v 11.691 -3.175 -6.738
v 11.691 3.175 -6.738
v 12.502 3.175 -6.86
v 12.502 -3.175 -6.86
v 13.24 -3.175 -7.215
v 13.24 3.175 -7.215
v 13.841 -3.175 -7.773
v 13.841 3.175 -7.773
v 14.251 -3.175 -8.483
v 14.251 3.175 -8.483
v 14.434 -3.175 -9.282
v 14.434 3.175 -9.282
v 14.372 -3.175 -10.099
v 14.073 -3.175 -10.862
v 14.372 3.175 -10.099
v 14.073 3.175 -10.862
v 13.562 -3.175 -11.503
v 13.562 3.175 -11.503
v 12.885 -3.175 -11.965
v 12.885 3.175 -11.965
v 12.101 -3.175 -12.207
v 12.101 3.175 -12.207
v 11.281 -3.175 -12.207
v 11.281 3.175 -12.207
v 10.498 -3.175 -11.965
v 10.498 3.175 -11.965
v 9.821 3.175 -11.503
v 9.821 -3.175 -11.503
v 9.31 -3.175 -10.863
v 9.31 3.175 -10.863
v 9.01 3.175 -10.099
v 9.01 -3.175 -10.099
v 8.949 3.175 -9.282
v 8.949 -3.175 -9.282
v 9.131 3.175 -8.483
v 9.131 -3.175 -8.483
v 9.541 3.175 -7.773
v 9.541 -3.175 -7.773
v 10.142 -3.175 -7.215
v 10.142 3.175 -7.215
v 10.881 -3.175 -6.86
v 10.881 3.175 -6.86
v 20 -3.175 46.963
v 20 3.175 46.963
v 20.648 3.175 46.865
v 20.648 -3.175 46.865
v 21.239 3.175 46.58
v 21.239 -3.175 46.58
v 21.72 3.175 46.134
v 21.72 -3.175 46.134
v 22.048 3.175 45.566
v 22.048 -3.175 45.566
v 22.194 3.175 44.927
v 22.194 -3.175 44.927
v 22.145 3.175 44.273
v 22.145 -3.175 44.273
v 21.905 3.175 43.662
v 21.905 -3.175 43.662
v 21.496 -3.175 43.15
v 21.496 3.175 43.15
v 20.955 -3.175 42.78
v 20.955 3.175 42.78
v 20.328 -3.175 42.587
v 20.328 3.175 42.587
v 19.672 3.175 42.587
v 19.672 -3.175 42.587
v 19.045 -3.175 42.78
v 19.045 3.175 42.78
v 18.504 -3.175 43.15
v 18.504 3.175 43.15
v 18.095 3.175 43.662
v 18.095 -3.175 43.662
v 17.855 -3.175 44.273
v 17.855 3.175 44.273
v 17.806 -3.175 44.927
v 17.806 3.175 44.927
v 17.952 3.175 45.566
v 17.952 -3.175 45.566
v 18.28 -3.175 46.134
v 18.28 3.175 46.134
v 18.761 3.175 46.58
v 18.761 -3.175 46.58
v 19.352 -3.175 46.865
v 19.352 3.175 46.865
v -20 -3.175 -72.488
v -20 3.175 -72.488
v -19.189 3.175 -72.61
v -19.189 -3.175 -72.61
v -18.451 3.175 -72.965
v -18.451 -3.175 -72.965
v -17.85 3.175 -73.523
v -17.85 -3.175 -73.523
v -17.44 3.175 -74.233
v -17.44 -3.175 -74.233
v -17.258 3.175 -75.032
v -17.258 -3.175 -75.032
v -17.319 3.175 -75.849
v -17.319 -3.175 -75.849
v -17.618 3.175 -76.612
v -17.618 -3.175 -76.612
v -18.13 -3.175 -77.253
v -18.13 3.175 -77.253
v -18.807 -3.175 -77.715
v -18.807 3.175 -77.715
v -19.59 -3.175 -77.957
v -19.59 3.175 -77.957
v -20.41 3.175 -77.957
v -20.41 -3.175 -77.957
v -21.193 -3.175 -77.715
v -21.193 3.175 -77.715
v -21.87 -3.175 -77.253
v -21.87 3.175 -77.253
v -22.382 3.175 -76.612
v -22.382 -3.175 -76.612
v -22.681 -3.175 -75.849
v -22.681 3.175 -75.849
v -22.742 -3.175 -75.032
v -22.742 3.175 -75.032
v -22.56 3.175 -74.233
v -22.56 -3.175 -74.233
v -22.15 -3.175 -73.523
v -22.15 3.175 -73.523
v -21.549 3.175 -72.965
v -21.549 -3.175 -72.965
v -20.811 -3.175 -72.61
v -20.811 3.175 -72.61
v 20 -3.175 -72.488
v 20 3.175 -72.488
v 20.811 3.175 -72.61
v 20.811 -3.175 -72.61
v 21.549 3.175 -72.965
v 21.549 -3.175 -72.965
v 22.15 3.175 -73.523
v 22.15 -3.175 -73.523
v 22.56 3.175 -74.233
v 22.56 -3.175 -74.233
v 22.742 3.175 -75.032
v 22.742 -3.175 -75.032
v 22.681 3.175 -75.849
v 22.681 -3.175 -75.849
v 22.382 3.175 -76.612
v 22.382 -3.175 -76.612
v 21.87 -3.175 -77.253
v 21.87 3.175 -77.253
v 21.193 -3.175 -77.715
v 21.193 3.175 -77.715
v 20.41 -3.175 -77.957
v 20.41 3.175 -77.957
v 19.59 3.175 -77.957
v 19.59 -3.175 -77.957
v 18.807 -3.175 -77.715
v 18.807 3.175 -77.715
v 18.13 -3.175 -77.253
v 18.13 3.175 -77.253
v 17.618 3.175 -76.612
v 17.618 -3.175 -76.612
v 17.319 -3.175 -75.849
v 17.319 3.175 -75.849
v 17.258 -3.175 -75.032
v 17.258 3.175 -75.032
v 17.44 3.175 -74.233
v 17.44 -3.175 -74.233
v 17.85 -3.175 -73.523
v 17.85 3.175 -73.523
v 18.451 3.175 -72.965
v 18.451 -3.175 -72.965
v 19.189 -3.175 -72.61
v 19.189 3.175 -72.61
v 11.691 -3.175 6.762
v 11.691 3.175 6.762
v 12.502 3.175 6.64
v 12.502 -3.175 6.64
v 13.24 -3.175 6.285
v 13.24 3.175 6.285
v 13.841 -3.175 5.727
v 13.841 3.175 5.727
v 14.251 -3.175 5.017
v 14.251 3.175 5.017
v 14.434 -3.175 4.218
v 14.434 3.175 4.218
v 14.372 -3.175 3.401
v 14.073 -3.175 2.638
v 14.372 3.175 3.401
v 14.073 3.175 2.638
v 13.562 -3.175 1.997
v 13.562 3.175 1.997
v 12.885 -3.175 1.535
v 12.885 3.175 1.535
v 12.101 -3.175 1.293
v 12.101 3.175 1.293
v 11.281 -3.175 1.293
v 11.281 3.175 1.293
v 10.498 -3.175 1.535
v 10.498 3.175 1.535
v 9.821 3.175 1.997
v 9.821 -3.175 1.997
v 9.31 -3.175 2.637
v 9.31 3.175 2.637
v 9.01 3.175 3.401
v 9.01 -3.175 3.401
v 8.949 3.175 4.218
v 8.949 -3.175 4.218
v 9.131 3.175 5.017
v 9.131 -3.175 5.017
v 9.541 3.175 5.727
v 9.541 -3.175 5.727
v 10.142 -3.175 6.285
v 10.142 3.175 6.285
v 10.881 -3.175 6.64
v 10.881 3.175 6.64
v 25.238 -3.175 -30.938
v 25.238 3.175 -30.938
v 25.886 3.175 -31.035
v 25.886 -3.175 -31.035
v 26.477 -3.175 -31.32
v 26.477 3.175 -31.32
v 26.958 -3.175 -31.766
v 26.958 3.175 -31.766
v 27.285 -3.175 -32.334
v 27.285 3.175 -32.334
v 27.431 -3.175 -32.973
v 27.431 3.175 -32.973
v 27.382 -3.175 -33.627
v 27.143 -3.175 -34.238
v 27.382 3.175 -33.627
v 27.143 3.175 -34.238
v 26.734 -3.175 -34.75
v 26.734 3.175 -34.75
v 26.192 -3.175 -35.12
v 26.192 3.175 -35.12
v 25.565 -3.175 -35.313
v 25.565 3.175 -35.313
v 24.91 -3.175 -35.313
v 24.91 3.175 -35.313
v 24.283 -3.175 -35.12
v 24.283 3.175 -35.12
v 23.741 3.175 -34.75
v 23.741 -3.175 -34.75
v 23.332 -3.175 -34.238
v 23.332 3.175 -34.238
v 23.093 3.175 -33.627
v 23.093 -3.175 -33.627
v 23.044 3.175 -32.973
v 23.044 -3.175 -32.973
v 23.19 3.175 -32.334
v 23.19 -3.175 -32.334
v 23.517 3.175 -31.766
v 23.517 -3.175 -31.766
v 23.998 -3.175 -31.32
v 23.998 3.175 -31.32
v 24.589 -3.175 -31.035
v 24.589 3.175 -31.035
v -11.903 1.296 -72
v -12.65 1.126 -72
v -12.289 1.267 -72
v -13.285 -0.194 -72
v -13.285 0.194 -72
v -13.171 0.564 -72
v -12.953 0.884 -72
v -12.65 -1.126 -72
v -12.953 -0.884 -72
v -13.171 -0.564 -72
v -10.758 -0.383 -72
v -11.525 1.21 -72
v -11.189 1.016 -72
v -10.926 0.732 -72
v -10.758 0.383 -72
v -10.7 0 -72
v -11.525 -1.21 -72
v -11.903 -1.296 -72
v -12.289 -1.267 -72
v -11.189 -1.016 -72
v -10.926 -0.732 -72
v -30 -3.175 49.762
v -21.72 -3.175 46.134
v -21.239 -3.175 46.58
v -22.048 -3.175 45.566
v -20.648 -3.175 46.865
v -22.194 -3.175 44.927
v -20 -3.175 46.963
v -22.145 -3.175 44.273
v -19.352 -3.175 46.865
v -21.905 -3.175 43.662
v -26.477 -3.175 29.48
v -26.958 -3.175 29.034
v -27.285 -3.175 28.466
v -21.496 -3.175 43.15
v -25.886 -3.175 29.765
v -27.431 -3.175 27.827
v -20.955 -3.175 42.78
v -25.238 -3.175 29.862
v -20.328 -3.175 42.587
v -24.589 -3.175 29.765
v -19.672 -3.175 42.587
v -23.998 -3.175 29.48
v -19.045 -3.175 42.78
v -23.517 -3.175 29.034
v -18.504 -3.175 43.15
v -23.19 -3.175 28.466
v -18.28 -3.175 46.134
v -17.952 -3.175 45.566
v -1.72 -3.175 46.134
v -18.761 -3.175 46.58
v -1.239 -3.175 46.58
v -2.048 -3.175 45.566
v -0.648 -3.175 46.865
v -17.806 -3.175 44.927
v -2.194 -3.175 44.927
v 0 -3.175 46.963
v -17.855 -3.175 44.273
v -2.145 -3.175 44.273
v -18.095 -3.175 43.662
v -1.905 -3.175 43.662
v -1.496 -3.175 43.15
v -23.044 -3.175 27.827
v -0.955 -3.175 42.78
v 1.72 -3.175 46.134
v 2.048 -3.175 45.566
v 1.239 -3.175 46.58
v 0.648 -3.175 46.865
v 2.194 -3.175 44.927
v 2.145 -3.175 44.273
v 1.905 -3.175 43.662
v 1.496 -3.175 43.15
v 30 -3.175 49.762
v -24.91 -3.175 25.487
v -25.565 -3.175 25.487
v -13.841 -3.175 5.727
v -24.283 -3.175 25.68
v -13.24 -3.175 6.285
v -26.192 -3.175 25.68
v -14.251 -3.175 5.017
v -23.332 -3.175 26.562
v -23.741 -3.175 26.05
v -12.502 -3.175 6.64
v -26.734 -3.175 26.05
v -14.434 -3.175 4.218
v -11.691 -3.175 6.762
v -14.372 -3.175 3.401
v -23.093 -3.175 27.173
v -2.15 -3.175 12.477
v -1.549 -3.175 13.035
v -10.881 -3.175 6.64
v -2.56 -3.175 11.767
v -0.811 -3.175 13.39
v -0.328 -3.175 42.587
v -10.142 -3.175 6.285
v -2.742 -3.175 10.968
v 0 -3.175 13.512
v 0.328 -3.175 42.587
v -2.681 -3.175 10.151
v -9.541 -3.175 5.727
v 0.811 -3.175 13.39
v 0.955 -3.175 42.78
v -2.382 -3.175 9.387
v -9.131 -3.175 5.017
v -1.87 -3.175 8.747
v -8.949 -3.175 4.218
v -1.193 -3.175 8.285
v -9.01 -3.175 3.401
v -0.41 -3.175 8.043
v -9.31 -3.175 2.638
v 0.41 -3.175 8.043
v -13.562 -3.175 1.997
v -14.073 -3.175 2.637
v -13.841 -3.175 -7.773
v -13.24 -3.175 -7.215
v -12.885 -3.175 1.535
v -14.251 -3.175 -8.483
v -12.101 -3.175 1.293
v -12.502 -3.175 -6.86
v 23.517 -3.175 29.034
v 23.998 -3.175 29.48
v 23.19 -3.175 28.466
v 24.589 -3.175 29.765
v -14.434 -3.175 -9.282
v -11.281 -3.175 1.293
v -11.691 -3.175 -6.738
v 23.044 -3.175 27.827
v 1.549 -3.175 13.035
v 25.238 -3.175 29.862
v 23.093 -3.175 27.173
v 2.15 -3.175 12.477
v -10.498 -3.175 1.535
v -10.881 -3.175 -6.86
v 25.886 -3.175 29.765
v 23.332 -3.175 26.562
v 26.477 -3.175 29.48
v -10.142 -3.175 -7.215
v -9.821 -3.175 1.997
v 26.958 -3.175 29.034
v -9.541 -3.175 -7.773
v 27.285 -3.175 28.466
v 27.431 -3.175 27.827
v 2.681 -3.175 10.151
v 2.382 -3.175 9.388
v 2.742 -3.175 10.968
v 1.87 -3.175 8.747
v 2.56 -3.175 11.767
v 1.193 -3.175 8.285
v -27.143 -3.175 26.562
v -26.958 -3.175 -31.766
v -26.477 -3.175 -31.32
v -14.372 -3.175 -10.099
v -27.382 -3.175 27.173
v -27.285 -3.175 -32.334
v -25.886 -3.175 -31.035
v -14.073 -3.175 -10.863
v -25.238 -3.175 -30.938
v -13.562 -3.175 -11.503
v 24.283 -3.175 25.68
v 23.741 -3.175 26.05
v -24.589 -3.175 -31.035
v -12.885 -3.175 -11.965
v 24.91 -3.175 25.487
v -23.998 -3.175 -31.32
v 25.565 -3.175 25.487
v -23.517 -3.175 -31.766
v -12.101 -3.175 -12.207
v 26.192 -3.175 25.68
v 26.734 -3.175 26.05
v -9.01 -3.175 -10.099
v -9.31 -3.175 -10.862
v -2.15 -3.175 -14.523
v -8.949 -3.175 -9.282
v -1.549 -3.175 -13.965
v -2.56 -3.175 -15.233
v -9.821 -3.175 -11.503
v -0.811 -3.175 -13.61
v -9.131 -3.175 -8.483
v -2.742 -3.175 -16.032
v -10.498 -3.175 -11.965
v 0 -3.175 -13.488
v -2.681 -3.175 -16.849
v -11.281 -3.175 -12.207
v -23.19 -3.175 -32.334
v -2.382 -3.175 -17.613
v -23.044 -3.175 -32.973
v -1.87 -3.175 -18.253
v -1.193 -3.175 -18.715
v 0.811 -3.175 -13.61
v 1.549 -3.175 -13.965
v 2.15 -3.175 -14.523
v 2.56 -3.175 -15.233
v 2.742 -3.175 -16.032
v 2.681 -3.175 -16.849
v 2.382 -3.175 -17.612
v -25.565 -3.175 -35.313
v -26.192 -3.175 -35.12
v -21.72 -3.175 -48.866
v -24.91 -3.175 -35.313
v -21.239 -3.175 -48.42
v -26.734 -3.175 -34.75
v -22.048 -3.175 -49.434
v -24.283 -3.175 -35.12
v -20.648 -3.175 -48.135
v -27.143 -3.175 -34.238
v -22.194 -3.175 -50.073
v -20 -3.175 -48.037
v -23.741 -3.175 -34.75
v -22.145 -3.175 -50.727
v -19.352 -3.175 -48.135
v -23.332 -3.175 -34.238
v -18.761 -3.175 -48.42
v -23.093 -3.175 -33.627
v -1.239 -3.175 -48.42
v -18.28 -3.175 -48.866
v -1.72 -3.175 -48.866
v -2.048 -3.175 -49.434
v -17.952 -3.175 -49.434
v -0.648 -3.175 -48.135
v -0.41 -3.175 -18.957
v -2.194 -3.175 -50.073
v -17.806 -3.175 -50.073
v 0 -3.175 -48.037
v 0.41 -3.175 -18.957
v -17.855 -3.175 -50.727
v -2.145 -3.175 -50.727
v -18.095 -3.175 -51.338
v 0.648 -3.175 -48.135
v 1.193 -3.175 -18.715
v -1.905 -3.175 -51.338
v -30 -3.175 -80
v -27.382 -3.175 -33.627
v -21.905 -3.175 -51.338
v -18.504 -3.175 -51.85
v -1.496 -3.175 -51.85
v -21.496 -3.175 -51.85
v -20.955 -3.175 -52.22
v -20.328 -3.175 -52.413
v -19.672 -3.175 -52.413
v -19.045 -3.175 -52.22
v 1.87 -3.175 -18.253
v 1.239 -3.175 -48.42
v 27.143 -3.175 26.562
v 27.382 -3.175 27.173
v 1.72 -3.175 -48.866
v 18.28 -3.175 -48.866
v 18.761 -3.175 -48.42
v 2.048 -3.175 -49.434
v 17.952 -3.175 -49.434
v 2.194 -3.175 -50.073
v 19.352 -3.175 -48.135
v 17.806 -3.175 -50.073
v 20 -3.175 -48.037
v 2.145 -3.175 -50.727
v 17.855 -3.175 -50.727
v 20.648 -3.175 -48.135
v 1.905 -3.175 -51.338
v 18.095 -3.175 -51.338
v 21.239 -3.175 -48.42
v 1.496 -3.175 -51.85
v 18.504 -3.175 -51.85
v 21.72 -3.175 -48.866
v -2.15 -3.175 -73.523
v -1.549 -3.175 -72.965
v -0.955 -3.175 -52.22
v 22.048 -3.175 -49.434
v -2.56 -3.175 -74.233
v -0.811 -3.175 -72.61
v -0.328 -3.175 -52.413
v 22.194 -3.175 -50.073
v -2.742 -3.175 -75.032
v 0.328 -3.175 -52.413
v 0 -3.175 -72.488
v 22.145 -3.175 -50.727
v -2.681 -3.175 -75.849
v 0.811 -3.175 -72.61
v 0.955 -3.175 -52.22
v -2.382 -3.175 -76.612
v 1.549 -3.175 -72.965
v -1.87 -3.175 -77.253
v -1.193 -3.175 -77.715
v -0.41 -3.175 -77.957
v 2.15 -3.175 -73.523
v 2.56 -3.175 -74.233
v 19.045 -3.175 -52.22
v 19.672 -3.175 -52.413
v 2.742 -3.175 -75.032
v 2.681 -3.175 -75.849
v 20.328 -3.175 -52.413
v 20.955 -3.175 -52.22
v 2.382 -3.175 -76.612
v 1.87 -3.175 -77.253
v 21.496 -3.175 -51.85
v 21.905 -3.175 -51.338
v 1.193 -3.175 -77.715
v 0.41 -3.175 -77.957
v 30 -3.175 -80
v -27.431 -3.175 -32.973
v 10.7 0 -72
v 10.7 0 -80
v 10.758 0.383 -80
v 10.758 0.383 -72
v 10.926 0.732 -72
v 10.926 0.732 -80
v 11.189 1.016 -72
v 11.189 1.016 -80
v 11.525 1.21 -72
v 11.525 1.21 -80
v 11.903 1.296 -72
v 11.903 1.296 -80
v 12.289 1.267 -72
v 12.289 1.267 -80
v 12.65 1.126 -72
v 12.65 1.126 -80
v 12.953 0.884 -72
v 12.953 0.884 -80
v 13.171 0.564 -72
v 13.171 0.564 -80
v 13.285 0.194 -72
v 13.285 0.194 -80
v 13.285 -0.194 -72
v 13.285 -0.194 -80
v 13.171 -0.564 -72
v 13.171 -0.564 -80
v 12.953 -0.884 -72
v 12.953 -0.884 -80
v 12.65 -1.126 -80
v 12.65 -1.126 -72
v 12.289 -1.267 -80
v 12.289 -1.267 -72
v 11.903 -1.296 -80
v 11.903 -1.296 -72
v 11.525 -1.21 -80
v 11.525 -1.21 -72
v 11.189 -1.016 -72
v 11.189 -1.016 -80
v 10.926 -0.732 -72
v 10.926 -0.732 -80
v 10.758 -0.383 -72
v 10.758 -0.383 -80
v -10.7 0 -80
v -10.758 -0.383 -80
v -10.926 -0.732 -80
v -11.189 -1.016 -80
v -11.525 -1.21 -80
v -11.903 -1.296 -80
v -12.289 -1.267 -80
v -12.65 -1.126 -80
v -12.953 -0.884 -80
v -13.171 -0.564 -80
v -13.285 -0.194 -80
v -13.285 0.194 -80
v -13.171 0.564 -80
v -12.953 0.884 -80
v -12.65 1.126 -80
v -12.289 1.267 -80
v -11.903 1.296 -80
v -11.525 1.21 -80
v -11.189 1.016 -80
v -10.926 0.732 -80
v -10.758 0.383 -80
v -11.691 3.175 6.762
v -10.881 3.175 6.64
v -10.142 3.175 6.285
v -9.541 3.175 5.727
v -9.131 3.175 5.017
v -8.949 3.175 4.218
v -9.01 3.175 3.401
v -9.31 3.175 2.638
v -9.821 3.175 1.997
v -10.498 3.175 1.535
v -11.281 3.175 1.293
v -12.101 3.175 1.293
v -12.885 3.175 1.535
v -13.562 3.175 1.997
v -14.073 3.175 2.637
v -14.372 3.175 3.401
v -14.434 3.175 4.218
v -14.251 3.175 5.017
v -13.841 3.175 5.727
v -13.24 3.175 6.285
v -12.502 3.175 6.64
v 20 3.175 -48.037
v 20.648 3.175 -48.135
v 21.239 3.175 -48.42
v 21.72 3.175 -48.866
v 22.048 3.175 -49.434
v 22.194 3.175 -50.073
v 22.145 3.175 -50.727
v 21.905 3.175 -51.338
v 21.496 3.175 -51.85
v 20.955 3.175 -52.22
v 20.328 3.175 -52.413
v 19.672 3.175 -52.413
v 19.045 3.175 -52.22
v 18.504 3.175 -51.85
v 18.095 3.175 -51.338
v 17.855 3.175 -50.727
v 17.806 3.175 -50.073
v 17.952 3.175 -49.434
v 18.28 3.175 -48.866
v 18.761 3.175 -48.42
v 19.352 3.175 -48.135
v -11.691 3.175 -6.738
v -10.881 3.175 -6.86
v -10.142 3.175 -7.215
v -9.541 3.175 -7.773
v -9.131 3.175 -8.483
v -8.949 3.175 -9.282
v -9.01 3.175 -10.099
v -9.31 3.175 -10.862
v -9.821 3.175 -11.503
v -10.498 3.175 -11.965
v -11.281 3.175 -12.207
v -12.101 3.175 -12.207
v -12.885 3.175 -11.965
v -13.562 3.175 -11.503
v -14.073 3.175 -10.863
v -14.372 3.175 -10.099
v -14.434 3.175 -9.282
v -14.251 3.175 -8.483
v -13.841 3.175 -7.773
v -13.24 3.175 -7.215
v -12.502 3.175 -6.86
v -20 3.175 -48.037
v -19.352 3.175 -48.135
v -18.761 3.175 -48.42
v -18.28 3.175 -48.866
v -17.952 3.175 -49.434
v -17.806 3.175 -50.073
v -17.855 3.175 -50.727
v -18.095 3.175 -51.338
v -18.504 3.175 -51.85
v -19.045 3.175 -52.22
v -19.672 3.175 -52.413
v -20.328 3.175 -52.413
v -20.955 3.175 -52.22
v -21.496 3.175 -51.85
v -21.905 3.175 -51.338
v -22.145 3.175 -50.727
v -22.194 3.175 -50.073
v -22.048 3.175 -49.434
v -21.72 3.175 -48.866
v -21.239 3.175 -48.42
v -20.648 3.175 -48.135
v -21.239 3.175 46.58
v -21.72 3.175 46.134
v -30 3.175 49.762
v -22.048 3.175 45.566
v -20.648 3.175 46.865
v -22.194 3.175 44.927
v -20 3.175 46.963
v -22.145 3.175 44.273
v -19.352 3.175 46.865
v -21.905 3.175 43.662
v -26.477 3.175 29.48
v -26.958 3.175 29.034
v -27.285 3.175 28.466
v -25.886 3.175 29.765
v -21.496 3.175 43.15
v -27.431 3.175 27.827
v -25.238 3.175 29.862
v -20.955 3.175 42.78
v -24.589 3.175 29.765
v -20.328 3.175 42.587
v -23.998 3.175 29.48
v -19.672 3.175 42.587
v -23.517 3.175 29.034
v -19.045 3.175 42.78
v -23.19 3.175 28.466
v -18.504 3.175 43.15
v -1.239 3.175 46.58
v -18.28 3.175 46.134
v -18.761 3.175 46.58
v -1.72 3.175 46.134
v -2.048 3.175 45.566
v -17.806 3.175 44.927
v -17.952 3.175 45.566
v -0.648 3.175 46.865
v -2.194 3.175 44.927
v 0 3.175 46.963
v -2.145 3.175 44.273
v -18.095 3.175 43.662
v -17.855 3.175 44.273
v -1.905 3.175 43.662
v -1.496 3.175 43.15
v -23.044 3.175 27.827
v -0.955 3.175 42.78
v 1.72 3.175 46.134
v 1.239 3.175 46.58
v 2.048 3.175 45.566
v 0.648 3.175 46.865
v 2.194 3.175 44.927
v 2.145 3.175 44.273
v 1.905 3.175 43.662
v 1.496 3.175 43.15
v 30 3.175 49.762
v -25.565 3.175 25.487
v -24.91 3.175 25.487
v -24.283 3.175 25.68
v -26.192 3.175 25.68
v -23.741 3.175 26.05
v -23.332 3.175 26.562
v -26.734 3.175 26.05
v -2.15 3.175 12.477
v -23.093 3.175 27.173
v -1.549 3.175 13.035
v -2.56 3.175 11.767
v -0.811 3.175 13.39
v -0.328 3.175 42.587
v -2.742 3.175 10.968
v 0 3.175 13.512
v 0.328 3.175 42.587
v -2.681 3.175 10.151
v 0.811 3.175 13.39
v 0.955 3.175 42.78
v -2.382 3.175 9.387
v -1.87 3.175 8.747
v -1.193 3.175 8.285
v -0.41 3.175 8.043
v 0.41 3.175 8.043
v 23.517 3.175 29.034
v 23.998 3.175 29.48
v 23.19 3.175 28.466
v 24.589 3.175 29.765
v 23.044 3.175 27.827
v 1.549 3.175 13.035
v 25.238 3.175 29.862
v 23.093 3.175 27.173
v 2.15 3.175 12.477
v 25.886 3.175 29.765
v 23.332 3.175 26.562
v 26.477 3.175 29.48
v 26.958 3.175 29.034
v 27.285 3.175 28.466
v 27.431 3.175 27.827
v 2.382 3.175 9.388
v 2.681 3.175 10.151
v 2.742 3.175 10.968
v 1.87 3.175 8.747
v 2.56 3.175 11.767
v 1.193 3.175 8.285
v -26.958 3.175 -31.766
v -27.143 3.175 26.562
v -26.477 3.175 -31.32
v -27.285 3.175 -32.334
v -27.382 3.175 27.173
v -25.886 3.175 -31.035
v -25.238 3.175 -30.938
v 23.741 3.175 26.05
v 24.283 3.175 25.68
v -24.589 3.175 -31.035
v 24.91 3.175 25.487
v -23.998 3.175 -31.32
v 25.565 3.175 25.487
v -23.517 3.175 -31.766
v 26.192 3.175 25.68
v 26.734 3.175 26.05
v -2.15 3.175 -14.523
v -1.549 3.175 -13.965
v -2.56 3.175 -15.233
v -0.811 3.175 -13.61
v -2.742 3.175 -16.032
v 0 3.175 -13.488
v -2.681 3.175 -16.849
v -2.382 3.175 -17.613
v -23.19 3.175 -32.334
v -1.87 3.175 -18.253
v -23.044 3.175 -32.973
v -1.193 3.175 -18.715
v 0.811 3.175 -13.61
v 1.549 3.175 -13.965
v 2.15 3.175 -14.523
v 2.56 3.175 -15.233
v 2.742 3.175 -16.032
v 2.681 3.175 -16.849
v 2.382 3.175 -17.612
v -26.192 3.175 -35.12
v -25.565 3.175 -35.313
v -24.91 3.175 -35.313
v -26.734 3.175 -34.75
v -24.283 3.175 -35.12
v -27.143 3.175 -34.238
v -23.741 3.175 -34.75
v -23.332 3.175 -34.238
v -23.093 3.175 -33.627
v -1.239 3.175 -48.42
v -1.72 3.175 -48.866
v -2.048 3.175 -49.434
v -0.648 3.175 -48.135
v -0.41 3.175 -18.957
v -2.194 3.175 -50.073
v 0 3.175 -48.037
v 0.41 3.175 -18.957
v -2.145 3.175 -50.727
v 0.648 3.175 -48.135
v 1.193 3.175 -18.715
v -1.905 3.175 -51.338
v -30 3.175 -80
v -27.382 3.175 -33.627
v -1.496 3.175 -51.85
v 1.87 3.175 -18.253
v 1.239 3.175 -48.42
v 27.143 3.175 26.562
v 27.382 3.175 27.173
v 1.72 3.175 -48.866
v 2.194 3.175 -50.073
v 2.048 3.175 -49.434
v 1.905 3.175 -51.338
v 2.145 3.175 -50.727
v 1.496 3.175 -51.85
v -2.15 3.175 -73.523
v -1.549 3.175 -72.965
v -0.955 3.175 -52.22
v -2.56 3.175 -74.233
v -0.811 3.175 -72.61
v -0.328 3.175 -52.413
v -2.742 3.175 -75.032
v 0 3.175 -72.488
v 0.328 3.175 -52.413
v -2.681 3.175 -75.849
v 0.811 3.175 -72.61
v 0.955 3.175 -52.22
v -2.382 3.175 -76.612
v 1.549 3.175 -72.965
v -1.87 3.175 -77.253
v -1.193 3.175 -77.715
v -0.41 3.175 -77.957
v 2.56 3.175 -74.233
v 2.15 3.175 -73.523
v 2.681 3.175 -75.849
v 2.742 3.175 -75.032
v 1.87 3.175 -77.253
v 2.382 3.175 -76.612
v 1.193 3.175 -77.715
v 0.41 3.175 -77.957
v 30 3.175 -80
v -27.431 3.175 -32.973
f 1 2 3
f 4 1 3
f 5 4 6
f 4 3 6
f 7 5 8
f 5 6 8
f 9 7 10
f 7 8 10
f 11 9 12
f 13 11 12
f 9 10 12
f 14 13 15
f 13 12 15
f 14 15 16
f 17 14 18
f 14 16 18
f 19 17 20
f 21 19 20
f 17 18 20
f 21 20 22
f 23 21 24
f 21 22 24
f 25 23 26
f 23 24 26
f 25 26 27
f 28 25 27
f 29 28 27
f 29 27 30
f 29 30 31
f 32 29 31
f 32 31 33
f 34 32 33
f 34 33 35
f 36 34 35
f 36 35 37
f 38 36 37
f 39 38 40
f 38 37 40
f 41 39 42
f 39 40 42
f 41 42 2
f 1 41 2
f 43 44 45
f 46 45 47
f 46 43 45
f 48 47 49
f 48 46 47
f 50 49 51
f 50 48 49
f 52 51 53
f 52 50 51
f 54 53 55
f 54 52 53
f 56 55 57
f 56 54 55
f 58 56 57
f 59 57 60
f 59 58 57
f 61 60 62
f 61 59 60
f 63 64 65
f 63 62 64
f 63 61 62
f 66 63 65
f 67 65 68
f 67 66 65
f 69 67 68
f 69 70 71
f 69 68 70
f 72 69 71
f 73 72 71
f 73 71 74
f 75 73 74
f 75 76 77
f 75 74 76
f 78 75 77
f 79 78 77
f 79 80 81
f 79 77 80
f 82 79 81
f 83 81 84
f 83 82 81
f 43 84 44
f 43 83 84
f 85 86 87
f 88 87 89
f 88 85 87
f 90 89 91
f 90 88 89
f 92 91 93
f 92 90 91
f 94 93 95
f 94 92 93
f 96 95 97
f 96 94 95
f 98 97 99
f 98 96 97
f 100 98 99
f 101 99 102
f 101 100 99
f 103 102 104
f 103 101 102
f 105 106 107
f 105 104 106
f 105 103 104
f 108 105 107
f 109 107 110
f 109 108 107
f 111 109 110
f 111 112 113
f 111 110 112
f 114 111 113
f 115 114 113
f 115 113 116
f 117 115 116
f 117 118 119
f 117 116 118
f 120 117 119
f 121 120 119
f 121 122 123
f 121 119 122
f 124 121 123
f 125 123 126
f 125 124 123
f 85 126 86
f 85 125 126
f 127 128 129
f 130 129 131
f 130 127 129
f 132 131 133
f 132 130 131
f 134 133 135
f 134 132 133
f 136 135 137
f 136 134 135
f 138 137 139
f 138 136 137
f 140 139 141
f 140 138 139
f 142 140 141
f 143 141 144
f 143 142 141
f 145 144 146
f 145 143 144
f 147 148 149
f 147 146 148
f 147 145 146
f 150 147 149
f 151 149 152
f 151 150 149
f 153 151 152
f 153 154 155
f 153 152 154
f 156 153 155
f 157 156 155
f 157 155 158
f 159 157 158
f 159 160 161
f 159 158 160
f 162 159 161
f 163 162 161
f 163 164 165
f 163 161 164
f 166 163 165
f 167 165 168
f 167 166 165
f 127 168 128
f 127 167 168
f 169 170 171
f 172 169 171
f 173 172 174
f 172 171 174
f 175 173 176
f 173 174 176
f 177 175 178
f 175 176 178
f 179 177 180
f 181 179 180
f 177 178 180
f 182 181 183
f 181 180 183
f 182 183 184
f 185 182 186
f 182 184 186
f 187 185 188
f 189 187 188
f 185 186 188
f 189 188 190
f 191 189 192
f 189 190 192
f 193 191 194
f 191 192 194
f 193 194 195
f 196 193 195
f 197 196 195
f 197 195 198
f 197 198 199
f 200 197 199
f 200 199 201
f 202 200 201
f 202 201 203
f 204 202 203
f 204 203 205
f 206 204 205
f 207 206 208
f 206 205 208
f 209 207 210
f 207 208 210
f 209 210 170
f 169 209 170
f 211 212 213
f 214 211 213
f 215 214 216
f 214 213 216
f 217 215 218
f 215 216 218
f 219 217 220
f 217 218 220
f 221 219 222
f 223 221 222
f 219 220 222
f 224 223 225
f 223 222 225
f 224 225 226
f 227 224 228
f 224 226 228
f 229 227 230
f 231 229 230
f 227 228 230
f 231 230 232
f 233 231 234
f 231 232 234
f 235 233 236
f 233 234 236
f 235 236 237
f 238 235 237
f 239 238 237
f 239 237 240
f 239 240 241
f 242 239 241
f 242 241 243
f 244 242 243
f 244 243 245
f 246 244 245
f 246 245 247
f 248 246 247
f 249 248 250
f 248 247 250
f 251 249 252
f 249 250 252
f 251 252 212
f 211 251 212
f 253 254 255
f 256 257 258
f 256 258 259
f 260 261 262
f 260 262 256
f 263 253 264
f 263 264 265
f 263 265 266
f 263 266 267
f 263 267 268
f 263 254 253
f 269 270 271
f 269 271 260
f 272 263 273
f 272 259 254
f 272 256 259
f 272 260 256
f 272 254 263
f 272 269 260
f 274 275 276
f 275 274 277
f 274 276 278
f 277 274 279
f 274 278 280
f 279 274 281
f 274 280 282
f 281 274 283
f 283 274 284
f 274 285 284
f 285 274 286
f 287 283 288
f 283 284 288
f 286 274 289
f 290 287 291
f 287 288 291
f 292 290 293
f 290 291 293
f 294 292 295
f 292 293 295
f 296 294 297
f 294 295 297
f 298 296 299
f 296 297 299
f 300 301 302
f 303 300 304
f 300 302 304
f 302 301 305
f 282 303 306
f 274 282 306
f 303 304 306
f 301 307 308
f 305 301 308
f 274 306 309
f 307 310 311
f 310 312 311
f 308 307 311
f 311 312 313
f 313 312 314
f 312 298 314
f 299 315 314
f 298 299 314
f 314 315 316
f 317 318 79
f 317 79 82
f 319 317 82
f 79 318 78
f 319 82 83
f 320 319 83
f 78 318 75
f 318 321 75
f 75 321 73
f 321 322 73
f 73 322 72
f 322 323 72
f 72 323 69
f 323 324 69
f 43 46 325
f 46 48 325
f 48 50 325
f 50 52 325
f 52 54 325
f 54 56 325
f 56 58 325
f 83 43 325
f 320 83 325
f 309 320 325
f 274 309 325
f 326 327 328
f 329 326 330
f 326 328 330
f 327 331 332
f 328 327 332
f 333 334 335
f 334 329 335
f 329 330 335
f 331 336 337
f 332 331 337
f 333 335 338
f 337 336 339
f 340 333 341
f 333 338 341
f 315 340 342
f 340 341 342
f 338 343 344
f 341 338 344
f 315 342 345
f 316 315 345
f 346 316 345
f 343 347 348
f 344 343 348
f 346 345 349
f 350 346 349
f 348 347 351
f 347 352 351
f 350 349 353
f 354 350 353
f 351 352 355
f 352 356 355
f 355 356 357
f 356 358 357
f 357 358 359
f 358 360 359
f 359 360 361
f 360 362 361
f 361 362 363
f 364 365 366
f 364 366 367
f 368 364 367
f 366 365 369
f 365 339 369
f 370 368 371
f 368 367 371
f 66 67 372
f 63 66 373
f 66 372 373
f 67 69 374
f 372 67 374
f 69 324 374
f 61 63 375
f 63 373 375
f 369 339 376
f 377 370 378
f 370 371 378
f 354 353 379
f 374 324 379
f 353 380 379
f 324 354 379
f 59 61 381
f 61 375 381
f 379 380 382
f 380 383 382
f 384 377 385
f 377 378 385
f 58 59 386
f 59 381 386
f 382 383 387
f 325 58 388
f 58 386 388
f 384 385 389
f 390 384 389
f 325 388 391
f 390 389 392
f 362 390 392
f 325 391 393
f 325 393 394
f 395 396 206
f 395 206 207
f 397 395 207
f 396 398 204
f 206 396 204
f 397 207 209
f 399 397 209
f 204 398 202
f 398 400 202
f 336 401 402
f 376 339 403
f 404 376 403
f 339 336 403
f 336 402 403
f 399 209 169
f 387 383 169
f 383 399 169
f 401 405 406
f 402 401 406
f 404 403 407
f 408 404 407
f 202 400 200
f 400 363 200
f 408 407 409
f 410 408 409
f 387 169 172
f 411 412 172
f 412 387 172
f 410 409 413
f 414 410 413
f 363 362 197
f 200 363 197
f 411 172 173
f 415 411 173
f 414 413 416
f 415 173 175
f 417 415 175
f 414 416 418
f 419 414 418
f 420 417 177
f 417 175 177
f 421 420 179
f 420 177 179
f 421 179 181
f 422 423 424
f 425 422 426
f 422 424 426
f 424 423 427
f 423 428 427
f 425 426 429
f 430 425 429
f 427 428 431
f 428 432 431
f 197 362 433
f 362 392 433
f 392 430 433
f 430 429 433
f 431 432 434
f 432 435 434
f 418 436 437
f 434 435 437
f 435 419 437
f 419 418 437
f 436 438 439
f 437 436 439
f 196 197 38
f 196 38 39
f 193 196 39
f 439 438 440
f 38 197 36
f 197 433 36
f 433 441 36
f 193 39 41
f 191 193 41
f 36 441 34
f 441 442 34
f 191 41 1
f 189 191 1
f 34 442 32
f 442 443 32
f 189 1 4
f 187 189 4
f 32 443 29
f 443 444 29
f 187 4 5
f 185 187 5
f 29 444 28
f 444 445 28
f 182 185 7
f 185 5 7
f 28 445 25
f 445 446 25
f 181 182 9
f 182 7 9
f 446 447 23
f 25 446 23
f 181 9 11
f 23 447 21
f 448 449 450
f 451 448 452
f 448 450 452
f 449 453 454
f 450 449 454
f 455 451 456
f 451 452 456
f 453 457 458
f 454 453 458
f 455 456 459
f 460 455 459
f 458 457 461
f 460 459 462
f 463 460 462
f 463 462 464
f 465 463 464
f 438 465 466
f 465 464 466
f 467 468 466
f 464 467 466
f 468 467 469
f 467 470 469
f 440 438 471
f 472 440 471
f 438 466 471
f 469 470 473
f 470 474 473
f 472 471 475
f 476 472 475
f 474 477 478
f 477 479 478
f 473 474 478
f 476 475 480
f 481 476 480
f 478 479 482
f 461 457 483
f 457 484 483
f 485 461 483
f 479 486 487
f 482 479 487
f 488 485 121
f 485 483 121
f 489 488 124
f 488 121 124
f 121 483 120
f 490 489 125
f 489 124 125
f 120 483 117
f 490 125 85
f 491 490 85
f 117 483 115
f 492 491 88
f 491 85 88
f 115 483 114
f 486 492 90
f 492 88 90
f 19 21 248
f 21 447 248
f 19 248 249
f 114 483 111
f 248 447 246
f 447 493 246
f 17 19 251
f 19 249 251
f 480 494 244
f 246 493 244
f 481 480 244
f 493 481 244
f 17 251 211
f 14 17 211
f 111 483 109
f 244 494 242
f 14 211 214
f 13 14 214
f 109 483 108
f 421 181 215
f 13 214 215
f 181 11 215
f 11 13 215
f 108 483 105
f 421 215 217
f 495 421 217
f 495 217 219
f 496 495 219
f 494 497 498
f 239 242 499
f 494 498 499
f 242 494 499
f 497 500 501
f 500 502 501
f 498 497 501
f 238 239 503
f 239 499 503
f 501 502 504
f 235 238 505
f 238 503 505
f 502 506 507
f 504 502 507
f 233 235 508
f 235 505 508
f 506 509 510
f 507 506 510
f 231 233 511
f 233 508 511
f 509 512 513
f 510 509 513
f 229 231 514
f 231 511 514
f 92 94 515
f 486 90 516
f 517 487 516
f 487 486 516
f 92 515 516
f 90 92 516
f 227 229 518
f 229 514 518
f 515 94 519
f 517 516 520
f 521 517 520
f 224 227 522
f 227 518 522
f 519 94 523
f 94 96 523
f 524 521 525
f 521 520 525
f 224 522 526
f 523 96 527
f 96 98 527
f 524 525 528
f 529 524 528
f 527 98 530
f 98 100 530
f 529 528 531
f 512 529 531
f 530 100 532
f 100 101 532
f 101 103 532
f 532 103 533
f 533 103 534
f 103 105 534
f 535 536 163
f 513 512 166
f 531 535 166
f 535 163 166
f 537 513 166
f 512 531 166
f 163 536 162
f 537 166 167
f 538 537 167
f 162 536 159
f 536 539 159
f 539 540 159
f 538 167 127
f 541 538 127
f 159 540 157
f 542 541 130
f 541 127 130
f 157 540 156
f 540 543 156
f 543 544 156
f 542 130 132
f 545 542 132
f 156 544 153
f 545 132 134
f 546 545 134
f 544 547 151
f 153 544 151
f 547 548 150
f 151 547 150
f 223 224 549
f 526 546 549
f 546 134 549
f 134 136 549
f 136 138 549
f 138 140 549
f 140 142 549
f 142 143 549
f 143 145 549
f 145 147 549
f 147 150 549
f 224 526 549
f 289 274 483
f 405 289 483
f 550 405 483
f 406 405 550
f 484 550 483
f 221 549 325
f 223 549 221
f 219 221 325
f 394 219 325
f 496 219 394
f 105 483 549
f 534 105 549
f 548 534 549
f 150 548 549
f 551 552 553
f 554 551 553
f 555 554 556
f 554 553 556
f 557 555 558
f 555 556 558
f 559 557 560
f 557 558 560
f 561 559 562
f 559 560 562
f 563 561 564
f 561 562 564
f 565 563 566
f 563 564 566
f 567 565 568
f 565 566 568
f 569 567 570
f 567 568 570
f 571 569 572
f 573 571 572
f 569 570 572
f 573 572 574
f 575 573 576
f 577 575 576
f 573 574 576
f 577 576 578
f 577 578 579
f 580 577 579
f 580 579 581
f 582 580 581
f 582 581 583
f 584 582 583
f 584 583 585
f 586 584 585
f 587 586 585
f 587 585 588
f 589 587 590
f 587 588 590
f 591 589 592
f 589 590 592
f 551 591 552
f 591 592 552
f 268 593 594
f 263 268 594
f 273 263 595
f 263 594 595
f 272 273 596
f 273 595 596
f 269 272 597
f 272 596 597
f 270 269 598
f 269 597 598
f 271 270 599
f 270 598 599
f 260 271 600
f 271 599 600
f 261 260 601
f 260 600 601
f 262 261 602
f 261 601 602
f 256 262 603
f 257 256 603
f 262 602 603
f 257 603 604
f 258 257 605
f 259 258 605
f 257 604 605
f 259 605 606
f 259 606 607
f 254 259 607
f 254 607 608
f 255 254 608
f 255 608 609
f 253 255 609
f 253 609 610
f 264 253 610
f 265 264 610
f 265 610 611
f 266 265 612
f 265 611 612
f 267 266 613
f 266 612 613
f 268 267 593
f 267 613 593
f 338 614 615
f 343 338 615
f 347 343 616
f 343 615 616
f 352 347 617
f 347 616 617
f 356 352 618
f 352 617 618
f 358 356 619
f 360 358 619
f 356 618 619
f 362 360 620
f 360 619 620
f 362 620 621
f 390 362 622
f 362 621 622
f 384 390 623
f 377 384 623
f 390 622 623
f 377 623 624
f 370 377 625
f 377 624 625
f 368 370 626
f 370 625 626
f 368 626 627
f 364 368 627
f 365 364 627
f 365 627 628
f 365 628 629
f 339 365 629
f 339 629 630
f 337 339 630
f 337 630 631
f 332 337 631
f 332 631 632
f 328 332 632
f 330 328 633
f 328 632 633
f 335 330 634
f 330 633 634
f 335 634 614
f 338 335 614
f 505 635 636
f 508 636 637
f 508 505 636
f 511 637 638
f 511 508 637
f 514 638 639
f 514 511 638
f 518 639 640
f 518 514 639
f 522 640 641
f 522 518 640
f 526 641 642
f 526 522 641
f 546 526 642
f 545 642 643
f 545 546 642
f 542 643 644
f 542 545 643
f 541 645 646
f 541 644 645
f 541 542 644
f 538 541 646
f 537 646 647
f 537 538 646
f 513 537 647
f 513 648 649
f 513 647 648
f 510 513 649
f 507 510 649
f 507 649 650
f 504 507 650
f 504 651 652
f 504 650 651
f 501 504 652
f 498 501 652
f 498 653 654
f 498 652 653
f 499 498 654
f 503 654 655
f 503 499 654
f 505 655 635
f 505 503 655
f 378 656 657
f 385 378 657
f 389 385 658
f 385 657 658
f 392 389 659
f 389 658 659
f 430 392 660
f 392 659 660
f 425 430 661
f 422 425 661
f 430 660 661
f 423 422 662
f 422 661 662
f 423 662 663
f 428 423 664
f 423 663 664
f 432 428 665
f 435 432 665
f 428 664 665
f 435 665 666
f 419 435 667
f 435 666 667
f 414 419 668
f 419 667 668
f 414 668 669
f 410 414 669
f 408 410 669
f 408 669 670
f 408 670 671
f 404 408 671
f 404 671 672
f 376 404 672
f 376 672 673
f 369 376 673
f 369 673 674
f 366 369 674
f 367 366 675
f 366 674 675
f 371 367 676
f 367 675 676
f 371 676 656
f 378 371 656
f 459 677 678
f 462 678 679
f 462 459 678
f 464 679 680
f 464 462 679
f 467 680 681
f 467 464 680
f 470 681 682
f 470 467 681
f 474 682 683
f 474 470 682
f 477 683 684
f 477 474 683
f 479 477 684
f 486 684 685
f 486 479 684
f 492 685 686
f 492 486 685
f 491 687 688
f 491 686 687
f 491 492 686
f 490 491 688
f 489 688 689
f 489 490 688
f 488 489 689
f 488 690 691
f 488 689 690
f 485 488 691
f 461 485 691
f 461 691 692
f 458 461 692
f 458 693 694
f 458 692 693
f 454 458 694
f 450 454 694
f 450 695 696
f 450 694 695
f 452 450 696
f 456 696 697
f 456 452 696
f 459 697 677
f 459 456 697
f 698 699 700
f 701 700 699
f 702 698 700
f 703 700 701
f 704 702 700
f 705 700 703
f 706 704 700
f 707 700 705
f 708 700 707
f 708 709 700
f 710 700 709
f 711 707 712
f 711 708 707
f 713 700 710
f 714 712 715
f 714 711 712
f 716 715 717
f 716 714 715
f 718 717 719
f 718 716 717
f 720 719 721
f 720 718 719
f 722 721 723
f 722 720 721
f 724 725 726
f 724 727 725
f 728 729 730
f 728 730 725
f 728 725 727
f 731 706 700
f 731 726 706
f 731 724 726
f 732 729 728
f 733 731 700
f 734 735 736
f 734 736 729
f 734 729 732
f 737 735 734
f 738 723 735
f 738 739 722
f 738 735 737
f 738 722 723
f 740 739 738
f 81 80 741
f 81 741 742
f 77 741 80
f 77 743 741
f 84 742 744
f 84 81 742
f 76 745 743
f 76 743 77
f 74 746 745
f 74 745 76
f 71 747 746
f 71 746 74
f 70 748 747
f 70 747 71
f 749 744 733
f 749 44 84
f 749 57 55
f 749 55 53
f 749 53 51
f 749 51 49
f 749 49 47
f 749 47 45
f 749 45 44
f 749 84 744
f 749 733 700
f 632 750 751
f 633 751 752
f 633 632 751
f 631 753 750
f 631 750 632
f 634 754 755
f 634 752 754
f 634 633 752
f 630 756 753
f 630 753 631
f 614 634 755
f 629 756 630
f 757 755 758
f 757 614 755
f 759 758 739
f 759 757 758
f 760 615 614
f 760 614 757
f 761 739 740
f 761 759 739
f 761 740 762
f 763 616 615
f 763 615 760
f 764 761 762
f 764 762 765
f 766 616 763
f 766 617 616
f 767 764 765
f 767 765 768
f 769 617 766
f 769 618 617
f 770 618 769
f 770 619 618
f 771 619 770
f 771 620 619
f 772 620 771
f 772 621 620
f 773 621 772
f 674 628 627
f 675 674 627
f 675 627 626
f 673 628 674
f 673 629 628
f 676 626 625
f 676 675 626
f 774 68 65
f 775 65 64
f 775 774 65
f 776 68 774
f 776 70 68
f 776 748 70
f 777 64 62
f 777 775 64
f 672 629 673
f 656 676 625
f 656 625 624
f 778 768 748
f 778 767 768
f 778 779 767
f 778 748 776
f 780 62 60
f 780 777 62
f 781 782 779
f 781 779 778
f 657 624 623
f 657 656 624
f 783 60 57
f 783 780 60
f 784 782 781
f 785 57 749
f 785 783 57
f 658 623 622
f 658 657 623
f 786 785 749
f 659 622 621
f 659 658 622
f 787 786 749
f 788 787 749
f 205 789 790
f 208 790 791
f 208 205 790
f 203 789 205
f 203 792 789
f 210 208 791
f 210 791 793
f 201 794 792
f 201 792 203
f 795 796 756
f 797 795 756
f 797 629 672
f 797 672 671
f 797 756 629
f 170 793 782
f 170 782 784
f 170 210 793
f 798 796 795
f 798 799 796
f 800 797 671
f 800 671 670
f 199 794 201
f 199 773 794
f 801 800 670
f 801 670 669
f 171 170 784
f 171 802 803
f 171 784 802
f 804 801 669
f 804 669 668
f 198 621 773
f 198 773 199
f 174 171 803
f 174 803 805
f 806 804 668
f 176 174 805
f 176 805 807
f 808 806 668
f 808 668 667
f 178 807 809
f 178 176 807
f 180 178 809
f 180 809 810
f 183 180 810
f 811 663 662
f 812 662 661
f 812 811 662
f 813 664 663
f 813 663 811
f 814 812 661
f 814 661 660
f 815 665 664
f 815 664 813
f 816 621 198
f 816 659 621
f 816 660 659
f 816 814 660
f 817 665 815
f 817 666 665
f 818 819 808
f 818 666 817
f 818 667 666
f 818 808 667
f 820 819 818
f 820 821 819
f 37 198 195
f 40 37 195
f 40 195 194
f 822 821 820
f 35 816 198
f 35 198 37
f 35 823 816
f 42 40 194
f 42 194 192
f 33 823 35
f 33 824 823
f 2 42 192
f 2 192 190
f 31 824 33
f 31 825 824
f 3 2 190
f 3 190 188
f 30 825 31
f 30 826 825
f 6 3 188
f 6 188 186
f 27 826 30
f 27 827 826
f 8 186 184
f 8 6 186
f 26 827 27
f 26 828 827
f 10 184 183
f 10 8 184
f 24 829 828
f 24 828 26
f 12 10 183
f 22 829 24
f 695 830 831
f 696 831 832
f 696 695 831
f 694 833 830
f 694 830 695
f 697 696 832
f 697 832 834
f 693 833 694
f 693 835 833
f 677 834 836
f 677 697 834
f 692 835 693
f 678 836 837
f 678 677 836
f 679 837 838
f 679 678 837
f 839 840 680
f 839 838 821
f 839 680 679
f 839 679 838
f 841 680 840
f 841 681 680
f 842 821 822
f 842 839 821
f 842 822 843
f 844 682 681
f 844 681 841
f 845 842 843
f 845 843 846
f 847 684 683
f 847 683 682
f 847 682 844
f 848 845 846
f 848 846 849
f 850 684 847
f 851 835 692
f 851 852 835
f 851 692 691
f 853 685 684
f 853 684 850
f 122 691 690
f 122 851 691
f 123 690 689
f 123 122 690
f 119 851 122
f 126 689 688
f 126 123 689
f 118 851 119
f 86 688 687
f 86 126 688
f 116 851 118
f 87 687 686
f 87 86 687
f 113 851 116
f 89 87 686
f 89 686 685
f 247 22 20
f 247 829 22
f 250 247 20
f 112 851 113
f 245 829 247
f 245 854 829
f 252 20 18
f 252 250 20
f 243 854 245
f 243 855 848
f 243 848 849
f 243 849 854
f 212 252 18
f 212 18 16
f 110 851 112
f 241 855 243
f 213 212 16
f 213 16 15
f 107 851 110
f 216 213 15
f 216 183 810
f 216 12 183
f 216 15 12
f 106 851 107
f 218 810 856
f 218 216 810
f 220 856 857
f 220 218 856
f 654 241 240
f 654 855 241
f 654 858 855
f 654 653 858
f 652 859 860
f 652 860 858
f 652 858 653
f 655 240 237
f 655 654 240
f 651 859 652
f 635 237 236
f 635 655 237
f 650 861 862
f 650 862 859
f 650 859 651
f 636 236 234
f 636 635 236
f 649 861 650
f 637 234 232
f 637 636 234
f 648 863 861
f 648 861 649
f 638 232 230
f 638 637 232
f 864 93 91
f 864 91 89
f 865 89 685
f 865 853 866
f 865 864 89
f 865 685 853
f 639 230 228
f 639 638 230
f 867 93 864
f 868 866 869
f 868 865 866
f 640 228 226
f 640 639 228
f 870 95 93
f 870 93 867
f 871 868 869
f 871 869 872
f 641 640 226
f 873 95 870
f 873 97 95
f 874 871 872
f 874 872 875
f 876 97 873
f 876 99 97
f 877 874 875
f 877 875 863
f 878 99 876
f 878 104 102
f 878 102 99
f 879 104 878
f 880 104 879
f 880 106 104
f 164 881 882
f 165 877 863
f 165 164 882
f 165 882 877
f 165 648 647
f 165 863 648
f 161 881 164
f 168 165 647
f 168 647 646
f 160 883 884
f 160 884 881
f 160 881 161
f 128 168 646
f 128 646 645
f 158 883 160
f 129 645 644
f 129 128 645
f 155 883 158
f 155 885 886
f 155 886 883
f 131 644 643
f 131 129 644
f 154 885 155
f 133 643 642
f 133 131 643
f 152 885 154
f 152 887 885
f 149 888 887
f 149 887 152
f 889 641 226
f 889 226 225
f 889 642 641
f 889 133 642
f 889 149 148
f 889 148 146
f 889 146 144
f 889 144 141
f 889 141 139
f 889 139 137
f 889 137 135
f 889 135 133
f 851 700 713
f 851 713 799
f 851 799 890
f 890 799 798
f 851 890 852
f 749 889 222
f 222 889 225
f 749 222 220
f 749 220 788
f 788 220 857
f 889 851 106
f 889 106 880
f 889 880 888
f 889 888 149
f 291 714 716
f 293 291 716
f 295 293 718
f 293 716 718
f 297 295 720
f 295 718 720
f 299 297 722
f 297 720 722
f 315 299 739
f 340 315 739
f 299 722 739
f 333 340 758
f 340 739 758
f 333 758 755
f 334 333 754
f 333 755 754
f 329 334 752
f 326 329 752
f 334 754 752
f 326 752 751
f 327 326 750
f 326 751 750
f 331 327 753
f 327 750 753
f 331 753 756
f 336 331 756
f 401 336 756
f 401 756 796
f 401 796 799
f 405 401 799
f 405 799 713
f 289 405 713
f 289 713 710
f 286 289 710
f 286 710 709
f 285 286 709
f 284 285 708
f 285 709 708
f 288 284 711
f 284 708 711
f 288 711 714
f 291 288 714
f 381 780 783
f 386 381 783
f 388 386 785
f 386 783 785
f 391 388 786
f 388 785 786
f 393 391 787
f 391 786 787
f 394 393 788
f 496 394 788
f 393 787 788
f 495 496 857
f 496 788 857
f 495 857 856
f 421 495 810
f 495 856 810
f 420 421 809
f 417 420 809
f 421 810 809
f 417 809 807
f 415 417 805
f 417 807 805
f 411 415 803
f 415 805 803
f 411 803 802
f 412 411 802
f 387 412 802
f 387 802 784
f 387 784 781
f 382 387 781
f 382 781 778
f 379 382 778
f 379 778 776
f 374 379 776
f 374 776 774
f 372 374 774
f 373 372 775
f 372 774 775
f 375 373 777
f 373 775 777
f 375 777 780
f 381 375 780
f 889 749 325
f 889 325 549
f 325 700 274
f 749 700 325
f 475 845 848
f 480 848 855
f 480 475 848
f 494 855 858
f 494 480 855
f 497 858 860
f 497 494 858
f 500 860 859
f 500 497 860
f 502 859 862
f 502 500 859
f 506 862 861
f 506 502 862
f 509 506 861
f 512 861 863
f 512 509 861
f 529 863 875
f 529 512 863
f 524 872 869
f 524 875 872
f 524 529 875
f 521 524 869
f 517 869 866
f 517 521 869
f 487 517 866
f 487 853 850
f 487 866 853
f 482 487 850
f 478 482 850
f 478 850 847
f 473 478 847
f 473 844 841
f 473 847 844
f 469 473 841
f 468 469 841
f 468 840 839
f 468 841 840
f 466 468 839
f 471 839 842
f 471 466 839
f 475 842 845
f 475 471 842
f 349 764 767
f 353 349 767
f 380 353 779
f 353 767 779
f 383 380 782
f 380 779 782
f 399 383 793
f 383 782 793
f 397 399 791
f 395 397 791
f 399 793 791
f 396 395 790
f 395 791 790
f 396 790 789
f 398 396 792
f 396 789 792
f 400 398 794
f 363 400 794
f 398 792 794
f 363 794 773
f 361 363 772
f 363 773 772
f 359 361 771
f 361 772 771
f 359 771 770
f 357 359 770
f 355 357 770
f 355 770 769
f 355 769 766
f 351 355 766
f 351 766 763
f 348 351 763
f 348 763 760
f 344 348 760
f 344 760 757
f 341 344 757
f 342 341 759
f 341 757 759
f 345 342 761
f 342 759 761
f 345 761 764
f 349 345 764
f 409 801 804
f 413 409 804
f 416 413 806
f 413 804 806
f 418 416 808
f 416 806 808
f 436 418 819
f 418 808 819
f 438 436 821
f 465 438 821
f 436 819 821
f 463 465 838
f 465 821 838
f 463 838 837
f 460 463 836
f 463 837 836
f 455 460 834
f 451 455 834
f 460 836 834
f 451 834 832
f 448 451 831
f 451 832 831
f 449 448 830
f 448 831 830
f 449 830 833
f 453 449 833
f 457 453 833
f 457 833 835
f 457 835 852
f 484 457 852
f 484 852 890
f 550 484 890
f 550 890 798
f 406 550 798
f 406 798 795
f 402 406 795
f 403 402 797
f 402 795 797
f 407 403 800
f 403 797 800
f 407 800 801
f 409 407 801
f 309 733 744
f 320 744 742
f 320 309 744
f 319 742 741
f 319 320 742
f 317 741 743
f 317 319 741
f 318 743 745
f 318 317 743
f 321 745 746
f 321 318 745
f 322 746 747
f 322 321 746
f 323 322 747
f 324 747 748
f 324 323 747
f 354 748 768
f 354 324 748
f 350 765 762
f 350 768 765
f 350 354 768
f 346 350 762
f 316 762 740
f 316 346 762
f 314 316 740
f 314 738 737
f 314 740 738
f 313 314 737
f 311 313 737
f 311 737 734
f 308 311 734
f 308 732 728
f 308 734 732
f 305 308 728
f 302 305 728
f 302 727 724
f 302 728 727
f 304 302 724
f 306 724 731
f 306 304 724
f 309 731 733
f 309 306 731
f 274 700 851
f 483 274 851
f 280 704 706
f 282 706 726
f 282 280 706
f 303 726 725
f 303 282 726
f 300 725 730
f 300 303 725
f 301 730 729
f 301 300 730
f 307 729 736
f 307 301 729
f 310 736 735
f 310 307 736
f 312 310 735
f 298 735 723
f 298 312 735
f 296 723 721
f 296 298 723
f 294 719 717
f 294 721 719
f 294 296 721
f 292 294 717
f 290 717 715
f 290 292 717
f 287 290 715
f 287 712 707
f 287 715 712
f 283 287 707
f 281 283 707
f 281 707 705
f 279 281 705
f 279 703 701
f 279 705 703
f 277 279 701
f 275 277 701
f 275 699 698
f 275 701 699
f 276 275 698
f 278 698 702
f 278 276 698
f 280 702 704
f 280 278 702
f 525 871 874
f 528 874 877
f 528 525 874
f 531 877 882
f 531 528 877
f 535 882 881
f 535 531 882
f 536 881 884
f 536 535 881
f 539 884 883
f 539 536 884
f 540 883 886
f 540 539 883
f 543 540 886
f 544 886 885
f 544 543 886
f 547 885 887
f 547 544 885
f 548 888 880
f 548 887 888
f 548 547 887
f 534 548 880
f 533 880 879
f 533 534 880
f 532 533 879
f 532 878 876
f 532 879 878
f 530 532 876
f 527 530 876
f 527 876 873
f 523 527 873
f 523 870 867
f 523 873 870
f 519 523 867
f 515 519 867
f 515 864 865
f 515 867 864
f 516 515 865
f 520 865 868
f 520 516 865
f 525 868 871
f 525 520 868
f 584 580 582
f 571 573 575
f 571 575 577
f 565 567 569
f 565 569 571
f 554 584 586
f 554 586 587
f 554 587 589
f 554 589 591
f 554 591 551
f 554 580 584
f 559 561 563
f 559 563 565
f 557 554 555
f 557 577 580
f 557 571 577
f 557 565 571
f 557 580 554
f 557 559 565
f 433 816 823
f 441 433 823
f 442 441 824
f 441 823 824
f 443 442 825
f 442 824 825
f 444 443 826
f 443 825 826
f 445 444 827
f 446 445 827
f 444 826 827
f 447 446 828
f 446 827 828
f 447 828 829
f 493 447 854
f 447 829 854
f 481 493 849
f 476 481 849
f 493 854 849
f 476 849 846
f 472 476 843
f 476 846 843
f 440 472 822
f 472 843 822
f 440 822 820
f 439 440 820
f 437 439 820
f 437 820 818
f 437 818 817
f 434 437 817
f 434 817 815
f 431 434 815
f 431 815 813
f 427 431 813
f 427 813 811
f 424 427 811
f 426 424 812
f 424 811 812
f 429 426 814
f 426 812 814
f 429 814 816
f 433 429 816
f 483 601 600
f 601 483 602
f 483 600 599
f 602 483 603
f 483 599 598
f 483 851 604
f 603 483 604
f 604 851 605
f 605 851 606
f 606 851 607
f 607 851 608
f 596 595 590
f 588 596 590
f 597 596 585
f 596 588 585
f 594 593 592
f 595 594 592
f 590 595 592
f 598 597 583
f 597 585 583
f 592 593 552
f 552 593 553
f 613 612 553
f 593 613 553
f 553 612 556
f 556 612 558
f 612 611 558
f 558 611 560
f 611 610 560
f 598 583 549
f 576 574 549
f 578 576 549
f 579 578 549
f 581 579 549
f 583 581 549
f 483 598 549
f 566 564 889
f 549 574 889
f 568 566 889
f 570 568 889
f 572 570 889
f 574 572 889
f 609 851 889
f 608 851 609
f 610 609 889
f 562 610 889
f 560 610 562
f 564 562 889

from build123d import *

# Parameters (mm, degrees)
SKETCH1_W               = 60
SKETCH1_H               = 160
BOSS_EXTRUDE1_DEPTH     = 3.175
M4_5_THROUGH_DEPTH      = 6.35
M4_5_THROUGH_DEPTH_BACK = 3.175
SKETCH3_R               = 2.75
SKETCH3_R_2             = 2.2
SKETCH4_R               = 1.3
M3_DRILL_DEPTH          = 8
SKETCH5_R               = 2.2
M4_THROUGH_DEPTH        = 6.35
SKETCH6_R               = 2.75
M5_THROUGH_DEPTH        = 6.35
SKETCH7_W               = 60
SKETCH7_H               = 30.2375
CUT_EXTRUDE1_DEPTH      = 6.35


with BuildPart() as part:
    # Sketch1 → Boss-Extrude1 (new, symmetric)
    with BuildSketch(Plane(origin=(0, 0, 0), x_dir=(1, 0, 0), z_dir=(0, 1, 0))):
        Rectangle(SKETCH1_W, SKETCH1_H)
    extrude(amount=BOSS_EXTRUDE1_DEPTH, both=True)

    # Sketch3 → M4/5_through (cut, two sides: drawn at the far end of the back side and taken through both)
    with BuildSketch(Plane(origin=(0, 0, 0), x_dir=(1, 0, 0), z_dir=(0, 1, 0)).offset(-M4_5_THROUGH_DEPTH_BACK)):
        with Locations(Location((20, 75.2375, 0), (0, 0, 270))):
            Circle(SKETCH3_R)
        with Locations(Location((20, 50.2375, 0), (0, 0, 270))):
            Circle(SKETCH3_R_2)
        with Locations(Location((-20, 50.2375, 0), (0, 0, 270))):
            Circle(SKETCH3_R_2)
        with Locations(Location((-20, 75.2375, 0), (0, 0, 270))):
            Circle(SKETCH3_R)
        with Locations(Location((0, 75.2375, 0), (0, 0, 270))):
            Circle(SKETCH3_R)
        with Locations(Location((0, 50.2375, 0), (0, 0, 270))):
            Circle(SKETCH3_R_2)
        with Locations(Location((20, -44.7625, 0), (0, 0, 270))):
            Circle(SKETCH3_R_2)
        with Locations(Location((-20, -44.7625, 0), (0, 0, 270))):
            Circle(SKETCH3_R_2)
        with Locations(Location((0, -44.7625, 0), (0, 0, 270))):
            Circle(SKETCH3_R_2)
    extrude(amount=M4_5_THROUGH_DEPTH + M4_5_THROUGH_DEPTH_BACK, mode=Mode.SUBTRACT)

    # Sketch4 → M3_DRILL (cut)
    with BuildSketch(Plane(origin=(0, 0, -80), x_dir=(-1, 0, 0), z_dir=(0, 0, -1))):
        with Locations((-12, 0)):
            Circle(SKETCH4_R)
        with Locations(Location((12, 0, 0), (0, 0, 180))):
            Circle(SKETCH4_R)
    extrude(amount=-M3_DRILL_DEPTH, mode=Mode.SUBTRACT)

    # Sketch5 → M4_through (cut)
    with BuildSketch(Plane(origin=(0, 3.175, 0), x_dir=(1, 0, 0), z_dir=(0, 1, 0))):
        with Locations(Location((-25.2375, -27.6625, 0), (0, 0, 270))):
            Circle(SKETCH5_R)
        with Locations(Location((25.2375, -27.6625, 0), (0, 0, 270))):
            Circle(SKETCH5_R)
        with Locations(Location((25.2375, 33.1375, 0), (0, 0, 270))):
            Circle(SKETCH5_R)
        with Locations(Location((-25.2375, 33.1375, 0), (0, 0, 270))):
            Circle(SKETCH5_R)
    extrude(amount=-M4_THROUGH_DEPTH, mode=Mode.SUBTRACT)

    # Sketch6 → M5_through (cut)
    with BuildSketch(Plane(origin=(0, 3.175, 0), x_dir=(1, 0, 0), z_dir=(0, 1, 0))):
        with Locations(Location((0, 16.2375, 0), (0, 0, 270))):
            Circle(SKETCH6_R)
        with Locations(Location((11.691342951, 9.4875, 0), (0, 0, 270))):
            Circle(SKETCH6_R)
        with Locations(Location((11.691342951, -4.0125, 0), (0, 0, 270))):
            Circle(SKETCH6_R)
        with Locations(Location((0, -10.7625, 0), (0, 0, 270))):
            Circle(SKETCH6_R)
        with Locations(Location((-11.691342951, -4.0125, 0), (0, 0, 270))):
            Circle(SKETCH6_R)
        with Locations(Location((-11.691342951, 9.4875, 0), (0, 0, 270))):
            Circle(SKETCH6_R)
    extrude(amount=-M5_THROUGH_DEPTH, mode=Mode.SUBTRACT)

    # Sketch7 → Cut-Extrude1 (cut)
    with BuildSketch(Plane(origin=(0, 3.175, 0), x_dir=(1, 0, 0), z_dir=(0, 1, 0))):
        with Locations((0, -64.88125)):
            Rectangle(SKETCH7_W, SKETCH7_H)
    extrude(amount=-CUT_EXTRUDE1_DEPTH, mode=Mode.SUBTRACT)


solid = part.part
